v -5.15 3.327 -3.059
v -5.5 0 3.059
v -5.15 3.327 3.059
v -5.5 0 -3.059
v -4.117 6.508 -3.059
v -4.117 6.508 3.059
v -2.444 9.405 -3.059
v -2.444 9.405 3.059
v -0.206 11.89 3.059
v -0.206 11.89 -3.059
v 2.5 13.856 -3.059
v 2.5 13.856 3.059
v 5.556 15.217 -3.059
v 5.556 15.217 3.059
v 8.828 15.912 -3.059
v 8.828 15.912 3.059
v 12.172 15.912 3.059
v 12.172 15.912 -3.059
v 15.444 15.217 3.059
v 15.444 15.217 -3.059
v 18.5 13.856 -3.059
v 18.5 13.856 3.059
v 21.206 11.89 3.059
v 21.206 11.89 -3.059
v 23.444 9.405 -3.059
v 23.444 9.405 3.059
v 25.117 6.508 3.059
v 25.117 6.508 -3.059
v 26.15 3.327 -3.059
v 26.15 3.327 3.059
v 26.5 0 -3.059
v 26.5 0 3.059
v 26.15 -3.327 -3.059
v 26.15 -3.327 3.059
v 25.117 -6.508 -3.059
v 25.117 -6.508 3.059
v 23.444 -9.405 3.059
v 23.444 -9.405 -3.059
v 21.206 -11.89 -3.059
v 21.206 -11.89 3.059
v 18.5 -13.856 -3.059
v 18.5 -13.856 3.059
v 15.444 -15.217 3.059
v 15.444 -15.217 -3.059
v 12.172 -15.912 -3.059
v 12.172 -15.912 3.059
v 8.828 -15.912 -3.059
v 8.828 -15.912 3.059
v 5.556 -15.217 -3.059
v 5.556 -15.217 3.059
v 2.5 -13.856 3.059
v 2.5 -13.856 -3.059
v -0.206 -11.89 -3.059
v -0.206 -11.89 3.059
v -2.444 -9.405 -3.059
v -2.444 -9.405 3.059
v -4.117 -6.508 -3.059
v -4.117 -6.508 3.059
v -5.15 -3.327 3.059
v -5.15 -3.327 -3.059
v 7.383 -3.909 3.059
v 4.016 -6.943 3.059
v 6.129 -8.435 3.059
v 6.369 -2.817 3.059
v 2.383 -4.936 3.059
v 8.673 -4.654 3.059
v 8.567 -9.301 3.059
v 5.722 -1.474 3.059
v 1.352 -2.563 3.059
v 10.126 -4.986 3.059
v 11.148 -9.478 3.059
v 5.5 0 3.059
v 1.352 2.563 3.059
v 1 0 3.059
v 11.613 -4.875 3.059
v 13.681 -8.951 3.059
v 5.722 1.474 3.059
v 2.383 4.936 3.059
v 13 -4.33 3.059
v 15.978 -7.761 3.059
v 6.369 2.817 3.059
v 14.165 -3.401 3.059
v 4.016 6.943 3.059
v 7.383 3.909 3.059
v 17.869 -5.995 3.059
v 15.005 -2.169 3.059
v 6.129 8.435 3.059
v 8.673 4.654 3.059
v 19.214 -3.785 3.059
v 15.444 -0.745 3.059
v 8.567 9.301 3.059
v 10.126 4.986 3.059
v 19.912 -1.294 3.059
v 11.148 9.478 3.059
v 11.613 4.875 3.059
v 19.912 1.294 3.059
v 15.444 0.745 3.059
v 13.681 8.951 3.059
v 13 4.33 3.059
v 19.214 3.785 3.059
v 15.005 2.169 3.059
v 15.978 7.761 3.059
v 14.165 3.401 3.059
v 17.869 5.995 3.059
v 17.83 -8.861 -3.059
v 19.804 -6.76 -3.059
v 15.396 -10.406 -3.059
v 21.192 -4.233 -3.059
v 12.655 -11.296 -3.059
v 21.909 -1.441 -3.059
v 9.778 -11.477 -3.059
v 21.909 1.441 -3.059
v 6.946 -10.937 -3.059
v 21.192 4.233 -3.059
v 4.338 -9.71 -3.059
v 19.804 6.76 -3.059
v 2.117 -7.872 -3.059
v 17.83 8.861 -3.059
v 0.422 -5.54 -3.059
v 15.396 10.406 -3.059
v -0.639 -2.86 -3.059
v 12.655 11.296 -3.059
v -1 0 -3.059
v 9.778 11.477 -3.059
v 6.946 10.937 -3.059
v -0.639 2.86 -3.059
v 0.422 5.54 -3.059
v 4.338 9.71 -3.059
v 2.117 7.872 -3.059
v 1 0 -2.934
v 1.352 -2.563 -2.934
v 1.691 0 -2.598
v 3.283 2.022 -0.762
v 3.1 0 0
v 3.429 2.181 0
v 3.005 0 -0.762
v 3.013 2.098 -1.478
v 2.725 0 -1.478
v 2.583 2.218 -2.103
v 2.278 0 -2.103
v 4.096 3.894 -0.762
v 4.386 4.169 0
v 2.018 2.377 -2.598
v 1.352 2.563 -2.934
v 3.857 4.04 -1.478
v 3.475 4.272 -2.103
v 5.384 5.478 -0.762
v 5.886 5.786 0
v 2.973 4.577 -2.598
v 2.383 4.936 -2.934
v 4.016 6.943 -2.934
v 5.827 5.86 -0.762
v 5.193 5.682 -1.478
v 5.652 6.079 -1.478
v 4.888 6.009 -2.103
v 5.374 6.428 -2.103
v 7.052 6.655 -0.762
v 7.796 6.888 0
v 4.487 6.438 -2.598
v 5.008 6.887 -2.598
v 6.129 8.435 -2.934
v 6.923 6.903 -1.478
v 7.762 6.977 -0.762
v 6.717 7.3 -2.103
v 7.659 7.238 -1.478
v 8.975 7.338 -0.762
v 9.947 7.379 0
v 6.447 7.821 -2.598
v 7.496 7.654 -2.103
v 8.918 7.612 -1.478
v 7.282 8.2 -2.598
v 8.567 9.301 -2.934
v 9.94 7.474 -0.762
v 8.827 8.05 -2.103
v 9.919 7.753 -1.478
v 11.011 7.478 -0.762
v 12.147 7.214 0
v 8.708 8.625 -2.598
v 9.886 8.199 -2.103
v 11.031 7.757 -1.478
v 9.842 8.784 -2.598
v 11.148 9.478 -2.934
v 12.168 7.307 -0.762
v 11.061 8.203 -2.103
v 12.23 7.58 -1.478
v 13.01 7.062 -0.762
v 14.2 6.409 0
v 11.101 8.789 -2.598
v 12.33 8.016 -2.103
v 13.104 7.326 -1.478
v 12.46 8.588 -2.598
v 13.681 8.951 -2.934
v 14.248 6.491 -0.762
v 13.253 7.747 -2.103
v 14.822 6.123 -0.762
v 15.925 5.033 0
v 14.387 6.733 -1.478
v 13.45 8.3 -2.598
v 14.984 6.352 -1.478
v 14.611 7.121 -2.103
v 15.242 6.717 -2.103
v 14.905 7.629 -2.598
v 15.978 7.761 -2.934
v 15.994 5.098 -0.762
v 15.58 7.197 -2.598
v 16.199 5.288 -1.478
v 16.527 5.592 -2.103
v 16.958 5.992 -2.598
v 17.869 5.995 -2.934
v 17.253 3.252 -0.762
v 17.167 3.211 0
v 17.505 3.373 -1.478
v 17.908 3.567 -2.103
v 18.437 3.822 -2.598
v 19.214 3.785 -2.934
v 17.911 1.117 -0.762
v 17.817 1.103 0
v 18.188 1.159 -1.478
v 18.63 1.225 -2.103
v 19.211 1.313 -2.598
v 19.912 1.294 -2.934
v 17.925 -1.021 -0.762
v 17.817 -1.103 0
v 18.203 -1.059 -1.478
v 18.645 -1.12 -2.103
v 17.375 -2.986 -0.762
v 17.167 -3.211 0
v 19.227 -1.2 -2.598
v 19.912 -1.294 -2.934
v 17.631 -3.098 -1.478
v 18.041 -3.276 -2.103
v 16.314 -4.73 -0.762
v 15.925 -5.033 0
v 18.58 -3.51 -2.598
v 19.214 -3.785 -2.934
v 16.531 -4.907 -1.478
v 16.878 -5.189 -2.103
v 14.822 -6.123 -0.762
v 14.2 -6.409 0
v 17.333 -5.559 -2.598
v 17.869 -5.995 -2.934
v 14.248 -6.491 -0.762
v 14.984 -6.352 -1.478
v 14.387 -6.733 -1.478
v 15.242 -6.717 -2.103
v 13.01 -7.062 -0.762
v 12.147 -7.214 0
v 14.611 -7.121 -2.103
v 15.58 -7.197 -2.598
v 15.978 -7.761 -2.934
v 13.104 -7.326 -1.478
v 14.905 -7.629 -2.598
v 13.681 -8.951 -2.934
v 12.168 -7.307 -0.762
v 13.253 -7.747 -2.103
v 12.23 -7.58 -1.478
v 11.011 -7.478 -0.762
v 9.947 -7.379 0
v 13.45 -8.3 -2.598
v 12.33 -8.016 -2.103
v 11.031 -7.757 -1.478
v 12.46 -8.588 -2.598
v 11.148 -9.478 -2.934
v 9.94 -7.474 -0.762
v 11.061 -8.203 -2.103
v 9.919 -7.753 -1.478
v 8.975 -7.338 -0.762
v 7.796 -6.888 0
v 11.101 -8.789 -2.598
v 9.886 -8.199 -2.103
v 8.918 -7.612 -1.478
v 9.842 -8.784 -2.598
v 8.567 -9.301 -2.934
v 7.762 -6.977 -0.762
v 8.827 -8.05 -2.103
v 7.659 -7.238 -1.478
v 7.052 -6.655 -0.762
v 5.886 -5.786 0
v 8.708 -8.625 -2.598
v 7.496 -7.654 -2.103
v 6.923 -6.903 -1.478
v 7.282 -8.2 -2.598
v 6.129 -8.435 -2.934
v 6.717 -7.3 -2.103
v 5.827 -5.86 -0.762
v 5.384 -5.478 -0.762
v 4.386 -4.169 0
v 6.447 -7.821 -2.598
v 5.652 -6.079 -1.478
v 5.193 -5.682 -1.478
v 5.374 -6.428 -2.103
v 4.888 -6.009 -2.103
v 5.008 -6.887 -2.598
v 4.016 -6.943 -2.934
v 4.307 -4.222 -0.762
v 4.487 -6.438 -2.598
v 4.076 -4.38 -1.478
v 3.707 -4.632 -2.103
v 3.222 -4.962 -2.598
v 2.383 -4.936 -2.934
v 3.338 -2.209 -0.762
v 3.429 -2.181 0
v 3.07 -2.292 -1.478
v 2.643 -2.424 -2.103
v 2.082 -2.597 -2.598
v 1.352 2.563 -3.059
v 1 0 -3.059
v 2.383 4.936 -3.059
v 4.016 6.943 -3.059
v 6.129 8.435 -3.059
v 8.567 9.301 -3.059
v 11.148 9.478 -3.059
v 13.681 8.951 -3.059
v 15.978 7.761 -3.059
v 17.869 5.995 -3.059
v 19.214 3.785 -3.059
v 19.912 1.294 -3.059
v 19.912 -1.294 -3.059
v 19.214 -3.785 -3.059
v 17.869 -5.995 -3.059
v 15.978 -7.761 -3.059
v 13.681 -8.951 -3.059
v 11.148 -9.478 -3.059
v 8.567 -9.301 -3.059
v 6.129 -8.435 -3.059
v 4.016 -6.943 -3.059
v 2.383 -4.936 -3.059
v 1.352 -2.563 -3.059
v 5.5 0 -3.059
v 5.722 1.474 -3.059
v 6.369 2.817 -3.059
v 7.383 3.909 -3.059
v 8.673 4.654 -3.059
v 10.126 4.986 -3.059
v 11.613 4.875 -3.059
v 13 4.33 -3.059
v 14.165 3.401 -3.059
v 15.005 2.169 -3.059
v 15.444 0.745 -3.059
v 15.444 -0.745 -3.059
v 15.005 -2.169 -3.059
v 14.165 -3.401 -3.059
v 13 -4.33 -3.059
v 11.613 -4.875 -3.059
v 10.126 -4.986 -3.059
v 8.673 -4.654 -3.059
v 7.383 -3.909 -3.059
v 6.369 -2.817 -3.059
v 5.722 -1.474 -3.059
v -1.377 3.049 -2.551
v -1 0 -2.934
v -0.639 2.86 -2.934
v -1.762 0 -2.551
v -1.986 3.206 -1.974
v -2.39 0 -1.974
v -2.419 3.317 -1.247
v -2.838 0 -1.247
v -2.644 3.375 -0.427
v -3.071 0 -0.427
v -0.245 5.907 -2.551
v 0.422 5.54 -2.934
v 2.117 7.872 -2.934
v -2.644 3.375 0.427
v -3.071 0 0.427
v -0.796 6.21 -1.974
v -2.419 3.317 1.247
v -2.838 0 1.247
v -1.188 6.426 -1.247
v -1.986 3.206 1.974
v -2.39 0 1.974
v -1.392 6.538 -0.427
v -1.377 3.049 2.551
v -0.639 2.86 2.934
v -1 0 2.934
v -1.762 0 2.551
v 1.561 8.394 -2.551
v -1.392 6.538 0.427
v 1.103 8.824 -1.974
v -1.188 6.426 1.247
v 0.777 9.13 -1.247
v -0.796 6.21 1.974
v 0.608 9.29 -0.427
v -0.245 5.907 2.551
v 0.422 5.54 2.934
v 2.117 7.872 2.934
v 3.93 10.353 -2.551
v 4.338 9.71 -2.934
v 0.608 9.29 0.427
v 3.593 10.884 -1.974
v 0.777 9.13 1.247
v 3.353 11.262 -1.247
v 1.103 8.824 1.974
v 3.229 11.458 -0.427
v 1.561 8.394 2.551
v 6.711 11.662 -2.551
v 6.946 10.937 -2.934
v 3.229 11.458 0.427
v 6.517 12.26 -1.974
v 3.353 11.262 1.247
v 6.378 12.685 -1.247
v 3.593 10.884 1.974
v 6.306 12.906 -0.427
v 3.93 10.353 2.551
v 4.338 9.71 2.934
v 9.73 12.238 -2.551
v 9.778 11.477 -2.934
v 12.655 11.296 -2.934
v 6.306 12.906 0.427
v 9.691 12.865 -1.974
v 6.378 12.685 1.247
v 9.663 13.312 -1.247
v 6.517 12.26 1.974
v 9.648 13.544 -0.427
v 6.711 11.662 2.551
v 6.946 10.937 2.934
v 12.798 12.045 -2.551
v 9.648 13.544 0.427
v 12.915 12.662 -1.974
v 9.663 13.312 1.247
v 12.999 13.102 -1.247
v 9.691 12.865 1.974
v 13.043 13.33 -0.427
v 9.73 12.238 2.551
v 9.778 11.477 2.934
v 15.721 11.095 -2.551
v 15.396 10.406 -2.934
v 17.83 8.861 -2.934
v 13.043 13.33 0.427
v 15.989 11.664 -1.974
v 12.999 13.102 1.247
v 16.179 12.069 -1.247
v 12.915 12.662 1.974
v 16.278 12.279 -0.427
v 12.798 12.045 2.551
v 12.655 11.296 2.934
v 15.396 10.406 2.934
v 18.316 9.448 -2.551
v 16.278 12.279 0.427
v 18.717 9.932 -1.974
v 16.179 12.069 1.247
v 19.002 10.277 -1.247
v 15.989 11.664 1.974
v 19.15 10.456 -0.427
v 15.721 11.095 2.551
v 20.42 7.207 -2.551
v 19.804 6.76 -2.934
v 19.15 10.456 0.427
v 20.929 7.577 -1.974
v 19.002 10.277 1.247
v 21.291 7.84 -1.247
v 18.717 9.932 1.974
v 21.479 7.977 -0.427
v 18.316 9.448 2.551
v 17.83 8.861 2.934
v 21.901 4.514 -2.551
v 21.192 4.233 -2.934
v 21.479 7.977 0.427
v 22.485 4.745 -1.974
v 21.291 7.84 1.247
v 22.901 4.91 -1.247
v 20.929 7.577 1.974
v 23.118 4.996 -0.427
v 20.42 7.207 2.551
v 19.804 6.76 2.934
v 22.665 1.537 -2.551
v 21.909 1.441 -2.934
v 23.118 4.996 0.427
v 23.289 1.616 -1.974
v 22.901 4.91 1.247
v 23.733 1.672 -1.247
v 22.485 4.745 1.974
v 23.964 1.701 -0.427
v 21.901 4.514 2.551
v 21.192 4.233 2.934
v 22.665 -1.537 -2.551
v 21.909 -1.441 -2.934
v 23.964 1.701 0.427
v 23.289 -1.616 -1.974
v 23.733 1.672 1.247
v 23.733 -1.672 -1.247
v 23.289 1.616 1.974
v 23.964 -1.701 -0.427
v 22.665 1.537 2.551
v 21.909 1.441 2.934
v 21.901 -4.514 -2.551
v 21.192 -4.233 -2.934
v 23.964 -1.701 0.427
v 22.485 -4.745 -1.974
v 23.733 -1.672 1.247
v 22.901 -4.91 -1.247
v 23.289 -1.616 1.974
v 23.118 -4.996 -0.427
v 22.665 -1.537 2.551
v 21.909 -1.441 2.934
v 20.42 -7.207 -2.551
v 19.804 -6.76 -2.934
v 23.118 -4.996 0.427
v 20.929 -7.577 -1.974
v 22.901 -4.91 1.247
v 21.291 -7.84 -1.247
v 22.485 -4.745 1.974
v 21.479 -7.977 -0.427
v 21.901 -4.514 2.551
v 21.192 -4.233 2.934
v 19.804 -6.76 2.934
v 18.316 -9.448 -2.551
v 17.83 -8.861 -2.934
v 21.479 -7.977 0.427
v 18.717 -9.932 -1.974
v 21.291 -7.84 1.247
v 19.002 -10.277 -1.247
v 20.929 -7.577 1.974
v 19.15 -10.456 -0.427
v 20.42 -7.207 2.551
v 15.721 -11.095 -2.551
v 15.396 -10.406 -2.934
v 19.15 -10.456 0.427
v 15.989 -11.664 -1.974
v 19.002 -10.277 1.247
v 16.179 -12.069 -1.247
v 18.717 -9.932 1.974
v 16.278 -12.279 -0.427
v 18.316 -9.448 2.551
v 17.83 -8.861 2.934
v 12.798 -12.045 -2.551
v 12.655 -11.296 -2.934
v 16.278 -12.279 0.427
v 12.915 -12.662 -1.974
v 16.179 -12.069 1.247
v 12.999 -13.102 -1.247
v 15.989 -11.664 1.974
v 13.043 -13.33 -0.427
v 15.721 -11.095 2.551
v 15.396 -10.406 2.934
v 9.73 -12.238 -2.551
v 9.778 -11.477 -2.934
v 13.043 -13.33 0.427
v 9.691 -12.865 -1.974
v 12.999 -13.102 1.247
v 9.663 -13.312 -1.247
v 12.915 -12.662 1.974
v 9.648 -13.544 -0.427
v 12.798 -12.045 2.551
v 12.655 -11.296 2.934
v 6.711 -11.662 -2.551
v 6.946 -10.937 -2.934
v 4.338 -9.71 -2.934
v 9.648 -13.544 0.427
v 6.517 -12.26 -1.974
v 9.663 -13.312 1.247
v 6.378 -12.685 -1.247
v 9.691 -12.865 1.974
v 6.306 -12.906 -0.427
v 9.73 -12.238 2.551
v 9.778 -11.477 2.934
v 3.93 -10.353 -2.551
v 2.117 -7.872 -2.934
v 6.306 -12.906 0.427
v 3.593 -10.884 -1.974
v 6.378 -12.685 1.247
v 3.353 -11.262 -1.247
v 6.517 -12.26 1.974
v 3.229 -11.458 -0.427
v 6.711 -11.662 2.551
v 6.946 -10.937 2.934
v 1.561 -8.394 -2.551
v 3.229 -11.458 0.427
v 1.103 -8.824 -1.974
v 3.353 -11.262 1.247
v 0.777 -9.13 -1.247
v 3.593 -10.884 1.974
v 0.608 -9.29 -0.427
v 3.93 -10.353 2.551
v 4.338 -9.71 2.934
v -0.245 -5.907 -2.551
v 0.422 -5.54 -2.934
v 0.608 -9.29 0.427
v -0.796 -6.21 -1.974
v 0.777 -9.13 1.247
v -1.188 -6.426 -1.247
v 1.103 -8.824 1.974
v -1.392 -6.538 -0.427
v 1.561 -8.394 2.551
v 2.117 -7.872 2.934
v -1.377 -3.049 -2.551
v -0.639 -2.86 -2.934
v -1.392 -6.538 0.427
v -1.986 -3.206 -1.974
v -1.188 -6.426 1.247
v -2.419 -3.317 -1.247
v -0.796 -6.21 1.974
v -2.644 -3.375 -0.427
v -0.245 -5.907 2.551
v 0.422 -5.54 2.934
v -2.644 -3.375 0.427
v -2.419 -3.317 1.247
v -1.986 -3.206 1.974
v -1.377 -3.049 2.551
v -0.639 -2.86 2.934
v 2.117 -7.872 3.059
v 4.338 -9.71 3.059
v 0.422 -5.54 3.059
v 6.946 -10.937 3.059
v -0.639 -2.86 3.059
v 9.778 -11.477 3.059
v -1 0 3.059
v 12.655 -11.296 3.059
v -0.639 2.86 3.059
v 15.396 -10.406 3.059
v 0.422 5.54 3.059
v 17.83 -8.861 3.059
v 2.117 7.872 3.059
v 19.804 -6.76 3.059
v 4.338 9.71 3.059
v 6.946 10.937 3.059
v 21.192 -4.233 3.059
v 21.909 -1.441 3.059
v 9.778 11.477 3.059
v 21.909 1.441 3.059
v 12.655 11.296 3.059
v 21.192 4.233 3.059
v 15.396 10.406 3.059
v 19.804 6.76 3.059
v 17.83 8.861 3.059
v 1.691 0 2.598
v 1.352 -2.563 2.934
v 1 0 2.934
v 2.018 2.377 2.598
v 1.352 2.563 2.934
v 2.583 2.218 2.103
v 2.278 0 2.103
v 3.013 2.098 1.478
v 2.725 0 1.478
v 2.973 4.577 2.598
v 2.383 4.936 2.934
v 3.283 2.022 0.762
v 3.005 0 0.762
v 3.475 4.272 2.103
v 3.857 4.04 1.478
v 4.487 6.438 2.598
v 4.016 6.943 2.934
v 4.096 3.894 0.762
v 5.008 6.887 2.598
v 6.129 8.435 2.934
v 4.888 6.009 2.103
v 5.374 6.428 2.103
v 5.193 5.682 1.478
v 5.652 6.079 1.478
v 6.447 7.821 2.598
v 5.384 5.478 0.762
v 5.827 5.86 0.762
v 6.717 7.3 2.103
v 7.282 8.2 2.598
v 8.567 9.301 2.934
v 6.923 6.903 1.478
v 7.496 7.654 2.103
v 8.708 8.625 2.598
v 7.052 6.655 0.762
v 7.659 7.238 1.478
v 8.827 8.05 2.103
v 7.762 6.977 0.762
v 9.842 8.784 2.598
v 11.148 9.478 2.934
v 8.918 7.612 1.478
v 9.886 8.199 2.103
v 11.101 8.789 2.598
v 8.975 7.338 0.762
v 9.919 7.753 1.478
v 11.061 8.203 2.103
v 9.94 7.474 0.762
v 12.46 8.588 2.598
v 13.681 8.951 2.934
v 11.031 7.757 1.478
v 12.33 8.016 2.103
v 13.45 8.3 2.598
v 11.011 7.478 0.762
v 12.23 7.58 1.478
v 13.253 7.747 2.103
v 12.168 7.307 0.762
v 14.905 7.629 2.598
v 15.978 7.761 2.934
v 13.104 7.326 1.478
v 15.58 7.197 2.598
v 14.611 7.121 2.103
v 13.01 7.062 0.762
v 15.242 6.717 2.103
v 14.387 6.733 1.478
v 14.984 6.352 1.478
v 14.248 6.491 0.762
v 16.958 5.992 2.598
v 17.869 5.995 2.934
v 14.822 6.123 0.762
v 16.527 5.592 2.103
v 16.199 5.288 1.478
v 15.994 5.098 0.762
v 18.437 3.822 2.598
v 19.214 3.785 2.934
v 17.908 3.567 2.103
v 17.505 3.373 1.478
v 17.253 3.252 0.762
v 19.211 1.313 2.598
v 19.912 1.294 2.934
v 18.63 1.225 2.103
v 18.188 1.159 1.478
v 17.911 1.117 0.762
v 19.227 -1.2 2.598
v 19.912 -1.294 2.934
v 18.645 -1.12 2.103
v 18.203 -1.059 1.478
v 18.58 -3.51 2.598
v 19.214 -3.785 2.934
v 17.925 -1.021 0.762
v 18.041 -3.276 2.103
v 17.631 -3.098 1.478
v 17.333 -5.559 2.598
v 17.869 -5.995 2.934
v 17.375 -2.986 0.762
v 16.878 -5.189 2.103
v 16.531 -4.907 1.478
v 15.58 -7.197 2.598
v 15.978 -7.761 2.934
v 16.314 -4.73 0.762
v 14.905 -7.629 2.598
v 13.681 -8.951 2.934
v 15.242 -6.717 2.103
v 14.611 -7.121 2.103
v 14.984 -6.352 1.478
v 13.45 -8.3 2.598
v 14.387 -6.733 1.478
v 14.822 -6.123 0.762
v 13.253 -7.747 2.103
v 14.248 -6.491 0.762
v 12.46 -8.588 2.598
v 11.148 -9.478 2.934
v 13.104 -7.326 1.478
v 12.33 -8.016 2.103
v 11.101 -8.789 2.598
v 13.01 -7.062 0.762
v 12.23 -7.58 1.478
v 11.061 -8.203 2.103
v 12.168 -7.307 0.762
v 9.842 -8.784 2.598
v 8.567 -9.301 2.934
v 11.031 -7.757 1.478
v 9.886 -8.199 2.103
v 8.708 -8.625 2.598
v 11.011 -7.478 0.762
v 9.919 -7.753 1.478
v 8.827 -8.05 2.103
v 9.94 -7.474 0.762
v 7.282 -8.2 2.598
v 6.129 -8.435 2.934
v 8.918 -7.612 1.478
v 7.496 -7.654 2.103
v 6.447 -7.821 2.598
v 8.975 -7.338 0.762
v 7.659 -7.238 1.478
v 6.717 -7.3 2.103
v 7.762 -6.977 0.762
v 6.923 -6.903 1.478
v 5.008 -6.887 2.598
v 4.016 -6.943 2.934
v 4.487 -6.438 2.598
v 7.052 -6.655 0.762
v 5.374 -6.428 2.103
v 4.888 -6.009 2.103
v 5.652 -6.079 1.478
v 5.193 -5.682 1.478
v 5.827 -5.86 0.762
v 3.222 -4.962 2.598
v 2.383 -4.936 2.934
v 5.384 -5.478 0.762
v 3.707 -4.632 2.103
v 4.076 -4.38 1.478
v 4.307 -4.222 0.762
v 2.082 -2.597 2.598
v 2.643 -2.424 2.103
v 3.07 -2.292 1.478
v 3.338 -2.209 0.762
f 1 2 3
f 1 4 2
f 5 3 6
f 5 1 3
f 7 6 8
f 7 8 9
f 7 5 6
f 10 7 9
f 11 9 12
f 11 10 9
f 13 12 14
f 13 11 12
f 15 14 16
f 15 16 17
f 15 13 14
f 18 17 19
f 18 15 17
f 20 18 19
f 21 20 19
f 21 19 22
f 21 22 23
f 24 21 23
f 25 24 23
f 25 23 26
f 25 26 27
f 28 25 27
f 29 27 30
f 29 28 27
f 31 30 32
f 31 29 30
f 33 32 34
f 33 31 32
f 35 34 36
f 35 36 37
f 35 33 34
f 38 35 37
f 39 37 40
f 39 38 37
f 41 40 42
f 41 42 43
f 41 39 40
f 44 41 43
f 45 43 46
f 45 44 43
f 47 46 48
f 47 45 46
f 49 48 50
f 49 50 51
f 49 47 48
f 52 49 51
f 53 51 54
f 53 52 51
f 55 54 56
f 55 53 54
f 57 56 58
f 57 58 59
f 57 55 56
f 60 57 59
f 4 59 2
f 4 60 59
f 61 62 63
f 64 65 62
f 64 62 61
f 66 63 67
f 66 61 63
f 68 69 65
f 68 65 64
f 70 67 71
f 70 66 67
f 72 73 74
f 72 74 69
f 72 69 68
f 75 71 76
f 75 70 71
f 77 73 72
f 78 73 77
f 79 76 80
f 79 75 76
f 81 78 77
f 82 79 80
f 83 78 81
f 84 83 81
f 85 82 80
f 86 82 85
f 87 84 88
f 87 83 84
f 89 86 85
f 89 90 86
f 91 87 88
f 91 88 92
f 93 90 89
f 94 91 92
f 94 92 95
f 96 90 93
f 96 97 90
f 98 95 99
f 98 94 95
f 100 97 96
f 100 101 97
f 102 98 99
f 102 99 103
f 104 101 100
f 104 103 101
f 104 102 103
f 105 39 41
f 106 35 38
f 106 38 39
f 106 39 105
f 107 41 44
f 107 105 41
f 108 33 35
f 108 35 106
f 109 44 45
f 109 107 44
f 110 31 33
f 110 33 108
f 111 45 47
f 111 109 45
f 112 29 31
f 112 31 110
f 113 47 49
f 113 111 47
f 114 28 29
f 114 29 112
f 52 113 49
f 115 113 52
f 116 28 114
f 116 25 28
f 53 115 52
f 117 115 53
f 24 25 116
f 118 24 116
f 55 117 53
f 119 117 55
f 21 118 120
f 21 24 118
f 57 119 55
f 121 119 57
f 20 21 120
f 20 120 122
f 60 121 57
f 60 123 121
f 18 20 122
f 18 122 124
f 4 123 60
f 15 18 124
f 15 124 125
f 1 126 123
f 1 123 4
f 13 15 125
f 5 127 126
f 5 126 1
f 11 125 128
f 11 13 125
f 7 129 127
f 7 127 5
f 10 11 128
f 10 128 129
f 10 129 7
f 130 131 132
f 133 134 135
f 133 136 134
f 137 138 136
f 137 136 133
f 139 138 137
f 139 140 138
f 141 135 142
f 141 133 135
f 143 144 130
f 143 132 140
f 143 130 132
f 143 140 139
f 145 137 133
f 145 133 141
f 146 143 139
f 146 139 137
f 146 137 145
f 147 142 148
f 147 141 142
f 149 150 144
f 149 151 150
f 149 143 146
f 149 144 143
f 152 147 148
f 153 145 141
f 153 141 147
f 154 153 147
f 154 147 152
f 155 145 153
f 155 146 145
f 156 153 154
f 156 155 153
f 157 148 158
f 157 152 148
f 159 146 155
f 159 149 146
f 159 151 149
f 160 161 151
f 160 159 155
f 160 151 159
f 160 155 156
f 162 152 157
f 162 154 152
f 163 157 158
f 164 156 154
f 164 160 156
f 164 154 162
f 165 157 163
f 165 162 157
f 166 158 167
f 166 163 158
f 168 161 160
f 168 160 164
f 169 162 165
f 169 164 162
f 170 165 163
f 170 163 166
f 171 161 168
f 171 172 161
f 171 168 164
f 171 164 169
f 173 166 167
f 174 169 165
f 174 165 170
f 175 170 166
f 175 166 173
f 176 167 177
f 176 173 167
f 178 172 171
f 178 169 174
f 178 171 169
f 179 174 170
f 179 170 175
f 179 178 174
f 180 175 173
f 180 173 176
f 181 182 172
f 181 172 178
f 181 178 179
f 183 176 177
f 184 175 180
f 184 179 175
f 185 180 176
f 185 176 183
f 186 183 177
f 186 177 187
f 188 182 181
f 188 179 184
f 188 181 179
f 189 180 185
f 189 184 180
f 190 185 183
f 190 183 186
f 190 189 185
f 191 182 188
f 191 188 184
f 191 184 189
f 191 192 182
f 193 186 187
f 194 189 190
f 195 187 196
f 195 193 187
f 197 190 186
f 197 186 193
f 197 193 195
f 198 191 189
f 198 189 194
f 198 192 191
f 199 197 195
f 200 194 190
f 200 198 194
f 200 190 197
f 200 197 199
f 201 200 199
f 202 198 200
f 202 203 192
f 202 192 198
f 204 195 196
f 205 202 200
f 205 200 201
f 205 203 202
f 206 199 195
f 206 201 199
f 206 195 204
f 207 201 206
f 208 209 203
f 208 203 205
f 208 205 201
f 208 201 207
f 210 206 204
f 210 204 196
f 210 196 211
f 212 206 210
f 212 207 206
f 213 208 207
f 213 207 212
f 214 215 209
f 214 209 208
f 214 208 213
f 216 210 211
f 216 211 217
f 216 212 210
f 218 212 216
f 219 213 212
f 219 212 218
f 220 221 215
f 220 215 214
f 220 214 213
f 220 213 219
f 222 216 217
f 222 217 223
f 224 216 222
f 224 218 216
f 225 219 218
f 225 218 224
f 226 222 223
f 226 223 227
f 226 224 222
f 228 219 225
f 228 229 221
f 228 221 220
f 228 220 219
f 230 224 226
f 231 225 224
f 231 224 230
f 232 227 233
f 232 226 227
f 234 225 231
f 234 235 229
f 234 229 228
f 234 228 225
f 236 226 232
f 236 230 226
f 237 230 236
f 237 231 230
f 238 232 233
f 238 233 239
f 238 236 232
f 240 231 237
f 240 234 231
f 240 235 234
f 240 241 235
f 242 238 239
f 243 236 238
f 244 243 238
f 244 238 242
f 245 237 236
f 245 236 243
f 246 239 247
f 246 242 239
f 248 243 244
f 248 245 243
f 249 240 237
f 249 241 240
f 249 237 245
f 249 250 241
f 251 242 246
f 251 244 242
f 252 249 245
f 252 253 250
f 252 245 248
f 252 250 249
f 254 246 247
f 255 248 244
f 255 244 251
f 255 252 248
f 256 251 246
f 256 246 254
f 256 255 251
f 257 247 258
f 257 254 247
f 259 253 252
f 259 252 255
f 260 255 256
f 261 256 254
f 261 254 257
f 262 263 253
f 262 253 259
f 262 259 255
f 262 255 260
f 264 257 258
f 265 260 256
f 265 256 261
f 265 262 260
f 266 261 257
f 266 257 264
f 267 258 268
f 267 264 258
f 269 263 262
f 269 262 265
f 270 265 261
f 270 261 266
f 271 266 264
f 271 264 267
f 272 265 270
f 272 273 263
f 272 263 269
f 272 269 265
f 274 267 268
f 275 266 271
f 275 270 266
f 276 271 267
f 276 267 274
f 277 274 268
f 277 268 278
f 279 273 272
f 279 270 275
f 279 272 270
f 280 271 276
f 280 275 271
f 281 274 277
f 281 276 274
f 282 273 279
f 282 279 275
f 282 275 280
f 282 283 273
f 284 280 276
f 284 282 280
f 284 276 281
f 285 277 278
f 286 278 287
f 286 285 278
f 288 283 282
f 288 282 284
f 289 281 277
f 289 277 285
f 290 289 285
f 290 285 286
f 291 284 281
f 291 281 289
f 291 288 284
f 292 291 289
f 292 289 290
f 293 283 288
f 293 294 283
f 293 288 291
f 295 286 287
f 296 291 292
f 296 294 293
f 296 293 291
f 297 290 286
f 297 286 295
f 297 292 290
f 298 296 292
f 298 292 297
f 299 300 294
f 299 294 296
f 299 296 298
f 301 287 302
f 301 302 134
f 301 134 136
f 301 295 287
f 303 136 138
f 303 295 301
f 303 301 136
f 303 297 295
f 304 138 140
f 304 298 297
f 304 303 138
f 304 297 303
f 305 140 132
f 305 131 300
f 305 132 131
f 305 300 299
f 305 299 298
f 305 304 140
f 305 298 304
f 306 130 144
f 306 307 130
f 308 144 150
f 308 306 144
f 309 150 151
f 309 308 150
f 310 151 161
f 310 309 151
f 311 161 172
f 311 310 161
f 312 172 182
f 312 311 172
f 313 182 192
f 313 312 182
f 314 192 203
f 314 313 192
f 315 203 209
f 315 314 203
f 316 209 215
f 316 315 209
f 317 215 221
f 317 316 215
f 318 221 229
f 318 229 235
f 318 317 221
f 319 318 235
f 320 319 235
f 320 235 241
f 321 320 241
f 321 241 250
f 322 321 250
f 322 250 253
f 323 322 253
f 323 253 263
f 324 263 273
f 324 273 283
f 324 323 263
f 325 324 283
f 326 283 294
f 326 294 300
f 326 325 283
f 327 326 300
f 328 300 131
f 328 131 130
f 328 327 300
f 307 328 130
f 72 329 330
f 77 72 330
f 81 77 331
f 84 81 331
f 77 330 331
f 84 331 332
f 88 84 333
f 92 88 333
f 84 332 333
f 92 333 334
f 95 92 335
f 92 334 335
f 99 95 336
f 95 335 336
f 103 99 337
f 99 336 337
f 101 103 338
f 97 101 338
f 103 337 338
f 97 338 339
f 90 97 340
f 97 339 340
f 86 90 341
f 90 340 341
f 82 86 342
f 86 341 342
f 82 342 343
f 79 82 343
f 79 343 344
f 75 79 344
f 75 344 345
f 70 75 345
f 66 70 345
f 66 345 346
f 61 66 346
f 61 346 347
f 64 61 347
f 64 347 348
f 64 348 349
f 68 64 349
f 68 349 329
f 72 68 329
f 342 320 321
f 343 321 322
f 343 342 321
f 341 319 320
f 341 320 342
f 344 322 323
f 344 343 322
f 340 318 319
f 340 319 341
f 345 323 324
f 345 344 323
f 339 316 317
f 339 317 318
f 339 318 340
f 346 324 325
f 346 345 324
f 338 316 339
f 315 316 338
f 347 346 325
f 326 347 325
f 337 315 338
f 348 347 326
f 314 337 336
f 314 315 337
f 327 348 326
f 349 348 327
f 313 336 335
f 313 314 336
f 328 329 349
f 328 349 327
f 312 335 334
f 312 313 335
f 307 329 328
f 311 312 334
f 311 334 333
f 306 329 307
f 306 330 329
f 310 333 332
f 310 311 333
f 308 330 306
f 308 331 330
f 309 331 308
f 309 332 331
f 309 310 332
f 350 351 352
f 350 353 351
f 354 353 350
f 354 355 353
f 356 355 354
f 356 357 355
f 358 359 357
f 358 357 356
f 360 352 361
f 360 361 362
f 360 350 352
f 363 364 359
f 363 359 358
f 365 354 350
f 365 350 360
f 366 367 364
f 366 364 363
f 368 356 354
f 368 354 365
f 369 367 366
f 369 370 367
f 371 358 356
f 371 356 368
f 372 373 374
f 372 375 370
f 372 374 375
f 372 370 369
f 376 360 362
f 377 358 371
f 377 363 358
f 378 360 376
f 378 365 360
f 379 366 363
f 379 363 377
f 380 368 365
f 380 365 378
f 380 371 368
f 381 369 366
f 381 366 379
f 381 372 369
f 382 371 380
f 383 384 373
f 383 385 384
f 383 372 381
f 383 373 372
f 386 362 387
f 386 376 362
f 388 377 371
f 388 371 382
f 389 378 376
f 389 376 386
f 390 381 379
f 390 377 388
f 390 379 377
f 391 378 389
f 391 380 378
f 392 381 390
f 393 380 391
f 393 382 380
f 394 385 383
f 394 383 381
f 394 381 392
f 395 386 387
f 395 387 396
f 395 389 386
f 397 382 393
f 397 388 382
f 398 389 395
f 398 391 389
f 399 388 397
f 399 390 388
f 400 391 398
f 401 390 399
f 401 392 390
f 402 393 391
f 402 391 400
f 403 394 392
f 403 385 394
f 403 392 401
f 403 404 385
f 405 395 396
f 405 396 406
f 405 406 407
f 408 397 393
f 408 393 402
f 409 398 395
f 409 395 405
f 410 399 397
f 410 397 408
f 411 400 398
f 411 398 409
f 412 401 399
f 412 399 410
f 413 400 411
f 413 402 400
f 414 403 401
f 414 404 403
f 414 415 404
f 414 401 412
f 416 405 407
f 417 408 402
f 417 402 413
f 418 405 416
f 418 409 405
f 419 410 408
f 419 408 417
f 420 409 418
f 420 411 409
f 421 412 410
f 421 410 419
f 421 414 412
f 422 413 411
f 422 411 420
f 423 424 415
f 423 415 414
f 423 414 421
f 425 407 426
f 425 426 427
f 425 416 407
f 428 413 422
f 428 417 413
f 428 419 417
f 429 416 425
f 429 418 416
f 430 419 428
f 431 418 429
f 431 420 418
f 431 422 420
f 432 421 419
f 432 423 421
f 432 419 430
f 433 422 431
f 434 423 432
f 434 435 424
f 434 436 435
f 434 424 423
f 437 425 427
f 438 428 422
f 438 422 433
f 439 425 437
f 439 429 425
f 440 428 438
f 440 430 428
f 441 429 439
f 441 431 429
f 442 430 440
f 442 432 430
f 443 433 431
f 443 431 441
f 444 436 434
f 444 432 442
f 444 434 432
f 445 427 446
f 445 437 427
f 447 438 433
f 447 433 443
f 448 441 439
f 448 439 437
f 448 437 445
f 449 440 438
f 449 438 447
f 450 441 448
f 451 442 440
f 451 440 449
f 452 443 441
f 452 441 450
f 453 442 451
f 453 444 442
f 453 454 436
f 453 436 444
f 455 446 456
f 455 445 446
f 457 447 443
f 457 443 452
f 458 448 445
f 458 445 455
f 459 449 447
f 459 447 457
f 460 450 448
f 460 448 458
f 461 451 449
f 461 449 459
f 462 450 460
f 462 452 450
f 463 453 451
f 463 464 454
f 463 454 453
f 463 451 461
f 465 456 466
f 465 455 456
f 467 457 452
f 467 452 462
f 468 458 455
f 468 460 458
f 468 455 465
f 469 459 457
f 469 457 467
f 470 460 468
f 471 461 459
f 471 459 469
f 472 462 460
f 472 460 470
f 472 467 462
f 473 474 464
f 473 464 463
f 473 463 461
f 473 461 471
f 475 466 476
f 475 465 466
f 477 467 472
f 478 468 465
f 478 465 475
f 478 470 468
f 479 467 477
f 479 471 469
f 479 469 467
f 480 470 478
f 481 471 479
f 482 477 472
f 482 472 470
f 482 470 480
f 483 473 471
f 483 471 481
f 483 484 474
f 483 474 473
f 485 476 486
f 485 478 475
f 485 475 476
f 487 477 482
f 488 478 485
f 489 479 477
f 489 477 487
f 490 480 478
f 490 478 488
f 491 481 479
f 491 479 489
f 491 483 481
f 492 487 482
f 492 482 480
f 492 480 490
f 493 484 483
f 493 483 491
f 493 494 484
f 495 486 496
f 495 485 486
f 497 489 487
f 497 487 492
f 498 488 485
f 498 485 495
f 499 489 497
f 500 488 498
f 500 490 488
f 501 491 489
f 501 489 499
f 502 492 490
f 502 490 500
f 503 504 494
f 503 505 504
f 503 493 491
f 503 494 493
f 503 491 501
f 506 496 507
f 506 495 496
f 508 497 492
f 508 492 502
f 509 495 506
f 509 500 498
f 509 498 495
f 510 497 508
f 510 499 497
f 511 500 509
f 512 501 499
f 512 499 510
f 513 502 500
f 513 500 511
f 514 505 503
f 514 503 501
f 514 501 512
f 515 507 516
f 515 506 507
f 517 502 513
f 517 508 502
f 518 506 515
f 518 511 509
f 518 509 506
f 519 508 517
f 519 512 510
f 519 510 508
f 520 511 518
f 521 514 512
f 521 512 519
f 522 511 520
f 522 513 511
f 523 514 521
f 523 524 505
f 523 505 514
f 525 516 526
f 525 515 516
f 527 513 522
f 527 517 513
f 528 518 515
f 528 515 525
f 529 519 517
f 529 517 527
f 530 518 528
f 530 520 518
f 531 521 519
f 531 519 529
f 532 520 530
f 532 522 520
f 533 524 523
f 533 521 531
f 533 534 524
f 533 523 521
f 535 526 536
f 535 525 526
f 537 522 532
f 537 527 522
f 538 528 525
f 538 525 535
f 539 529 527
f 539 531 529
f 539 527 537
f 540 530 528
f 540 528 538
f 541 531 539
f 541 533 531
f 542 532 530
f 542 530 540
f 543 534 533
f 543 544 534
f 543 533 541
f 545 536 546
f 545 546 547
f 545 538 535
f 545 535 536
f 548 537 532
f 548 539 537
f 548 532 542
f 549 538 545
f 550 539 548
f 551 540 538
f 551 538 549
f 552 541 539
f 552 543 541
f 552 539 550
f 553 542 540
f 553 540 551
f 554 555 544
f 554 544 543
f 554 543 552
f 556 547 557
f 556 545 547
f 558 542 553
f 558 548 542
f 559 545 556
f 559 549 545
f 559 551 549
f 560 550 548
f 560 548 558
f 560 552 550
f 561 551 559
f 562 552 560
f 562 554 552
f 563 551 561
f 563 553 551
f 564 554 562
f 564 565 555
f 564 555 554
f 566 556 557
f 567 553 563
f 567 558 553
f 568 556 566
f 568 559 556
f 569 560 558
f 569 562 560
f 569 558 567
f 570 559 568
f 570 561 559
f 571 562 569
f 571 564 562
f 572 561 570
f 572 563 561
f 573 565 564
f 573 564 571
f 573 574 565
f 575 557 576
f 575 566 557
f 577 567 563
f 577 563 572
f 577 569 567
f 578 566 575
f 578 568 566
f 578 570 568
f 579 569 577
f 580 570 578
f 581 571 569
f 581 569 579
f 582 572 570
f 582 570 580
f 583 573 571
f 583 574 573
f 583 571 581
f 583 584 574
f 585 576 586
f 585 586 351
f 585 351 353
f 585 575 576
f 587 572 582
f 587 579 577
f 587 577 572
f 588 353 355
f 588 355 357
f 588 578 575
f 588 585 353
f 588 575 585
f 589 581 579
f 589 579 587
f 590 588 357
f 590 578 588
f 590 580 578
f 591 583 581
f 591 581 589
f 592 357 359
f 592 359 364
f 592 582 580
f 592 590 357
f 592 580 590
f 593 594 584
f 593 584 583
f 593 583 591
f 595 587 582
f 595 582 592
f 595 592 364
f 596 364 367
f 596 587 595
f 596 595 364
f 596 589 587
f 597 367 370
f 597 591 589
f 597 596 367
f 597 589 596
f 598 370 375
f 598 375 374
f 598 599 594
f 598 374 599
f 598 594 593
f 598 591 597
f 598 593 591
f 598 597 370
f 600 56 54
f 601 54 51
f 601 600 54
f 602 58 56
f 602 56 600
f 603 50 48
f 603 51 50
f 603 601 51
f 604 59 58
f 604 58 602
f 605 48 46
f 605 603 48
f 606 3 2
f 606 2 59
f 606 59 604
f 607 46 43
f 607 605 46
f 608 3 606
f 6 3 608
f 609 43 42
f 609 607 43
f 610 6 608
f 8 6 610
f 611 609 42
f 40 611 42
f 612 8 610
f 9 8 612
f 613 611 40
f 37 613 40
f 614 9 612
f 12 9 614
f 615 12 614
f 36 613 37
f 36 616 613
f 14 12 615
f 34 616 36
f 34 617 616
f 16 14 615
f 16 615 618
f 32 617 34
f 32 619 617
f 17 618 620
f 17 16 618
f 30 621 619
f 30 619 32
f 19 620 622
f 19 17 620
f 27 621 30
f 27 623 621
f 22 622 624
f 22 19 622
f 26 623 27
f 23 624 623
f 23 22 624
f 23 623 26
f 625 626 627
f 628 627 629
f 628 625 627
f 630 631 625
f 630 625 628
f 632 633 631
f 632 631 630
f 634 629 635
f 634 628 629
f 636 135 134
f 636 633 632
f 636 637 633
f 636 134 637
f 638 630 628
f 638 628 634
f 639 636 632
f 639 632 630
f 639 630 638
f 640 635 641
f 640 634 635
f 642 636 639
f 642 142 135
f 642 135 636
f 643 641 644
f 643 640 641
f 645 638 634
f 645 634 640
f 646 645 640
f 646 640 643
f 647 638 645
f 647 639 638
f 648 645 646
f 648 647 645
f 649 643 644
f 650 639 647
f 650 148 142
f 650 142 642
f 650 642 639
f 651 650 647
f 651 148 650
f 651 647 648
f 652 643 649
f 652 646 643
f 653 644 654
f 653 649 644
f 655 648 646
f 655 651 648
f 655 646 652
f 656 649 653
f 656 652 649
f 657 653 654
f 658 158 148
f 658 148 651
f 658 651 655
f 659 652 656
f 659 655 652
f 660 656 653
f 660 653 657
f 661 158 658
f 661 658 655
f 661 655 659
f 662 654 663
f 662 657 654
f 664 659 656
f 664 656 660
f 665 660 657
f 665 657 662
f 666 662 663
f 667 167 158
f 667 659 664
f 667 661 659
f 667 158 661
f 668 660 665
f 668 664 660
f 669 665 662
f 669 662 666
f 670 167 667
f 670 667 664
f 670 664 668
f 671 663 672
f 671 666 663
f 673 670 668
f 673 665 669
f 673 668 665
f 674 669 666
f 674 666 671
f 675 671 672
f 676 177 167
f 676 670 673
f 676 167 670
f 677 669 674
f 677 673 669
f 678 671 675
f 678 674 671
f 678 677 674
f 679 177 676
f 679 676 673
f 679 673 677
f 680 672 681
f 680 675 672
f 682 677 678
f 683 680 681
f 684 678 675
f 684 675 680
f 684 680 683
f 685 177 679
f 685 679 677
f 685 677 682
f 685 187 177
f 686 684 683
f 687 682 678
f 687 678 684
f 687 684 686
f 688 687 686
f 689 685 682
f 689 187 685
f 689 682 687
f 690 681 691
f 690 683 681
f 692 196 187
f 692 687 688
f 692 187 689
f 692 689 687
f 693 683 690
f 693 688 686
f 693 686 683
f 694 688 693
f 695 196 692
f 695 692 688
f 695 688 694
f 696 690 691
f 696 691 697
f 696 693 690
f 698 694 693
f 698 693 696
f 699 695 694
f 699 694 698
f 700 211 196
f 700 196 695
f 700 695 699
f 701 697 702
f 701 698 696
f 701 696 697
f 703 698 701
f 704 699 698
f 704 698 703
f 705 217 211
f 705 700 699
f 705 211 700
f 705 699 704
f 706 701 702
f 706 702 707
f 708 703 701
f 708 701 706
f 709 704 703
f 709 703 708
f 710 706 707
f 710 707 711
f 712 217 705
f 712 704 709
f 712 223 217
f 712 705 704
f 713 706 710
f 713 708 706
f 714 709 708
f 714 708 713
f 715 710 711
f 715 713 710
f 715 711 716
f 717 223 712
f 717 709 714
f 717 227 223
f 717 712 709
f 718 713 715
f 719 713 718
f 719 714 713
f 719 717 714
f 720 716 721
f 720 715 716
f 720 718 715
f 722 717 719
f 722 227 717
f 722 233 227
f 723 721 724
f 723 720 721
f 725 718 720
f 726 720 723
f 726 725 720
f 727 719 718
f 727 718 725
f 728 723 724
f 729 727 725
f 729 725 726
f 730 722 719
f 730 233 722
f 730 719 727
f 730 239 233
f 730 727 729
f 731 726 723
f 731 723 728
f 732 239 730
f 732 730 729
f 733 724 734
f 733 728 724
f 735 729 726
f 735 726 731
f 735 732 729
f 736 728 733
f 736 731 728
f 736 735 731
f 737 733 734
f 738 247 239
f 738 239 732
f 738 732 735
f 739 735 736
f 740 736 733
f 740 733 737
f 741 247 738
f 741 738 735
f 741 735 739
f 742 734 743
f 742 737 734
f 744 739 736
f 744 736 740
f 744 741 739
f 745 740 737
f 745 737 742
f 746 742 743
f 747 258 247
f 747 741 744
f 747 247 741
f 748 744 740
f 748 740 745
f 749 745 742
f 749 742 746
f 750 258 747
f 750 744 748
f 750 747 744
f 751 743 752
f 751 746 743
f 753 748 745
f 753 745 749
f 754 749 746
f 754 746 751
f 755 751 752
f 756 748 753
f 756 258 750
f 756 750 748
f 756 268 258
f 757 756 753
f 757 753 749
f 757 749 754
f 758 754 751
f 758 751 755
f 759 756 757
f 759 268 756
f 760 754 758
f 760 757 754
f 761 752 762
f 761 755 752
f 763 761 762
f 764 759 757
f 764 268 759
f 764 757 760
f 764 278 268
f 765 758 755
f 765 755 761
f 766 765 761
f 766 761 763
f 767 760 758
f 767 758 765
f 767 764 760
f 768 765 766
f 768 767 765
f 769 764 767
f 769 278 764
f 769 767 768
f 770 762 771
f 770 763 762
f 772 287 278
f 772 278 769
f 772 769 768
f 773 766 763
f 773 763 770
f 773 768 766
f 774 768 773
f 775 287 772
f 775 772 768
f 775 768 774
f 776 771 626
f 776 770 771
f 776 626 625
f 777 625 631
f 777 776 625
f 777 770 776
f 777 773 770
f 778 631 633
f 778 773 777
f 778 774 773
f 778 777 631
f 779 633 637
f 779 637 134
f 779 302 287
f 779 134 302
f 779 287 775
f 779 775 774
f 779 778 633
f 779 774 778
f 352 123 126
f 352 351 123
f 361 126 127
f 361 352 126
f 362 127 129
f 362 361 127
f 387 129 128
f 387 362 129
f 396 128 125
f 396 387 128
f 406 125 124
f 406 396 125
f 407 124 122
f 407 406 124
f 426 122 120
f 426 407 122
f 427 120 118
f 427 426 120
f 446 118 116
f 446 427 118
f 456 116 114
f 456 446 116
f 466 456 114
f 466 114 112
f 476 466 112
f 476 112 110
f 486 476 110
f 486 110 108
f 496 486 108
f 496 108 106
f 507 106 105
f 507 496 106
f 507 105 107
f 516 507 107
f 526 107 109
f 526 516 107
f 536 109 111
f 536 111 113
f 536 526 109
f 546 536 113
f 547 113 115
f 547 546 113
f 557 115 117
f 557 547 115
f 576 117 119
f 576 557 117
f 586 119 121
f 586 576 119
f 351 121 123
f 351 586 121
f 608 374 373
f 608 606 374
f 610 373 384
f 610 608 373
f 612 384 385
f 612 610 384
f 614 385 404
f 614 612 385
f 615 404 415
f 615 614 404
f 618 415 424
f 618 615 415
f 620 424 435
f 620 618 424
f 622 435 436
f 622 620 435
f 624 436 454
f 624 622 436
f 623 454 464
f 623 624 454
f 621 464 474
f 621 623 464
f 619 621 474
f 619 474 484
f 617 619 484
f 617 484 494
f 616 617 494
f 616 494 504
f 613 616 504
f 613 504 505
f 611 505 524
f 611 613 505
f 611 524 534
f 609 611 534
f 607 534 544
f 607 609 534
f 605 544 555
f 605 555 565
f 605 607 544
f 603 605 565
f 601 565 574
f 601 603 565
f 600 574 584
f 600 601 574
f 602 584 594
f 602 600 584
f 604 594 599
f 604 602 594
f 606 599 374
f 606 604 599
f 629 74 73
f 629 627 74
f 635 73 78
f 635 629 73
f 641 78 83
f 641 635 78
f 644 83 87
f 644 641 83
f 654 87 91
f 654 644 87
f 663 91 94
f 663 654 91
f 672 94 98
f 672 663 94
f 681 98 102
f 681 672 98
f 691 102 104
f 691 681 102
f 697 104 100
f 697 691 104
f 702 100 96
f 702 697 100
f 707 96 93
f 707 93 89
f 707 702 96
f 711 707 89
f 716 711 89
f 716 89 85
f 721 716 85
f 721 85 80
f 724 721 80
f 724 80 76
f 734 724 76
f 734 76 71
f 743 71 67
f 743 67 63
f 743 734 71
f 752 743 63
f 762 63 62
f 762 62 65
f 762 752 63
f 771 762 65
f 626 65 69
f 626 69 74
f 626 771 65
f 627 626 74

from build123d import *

# Parameters (mm, degrees)
F4_D = 10


with BuildPart() as f1:
    # F0 (on Front) → F1 (revolve)
    with BuildSketch(Plane.XZ):
        with BuildLine():
            Line((1, 3.059412), (1, 2.93428))
            ThreePointArc((1, 2.93428), (2.520913, 1.804162), (3.1, 0))
            ThreePointArc((3.1, 0), (2.520913, -1.804162), (1, -2.93428))
            Line((1, -2.93428), (1, -3.059412))
            Line((1, -3.059412), (10.5, -3.059412))
            Line((10.5, -3.059412), (10.5, 3.059412))
            Line((10.5, 3.059412), (1, 3.059412))
        make_face()
    revolve(axis=Axis((10.5, 0, 0), (0, 0, -1)))

    # F4 (through all)
    with Locations(Plane.XY.offset(3.059412)):
        with Locations((10.5, 0)):
            Hole(F4_D / 2)


with BuildPart() as f2:
    # F0 (on Front) → F2 (revolve)
    with BuildSketch(Plane.XZ):
        with BuildLine():
            ThreePointArc((-1, -2.93428), (-3.1, 0), (-1, 2.93428))
            Line((-1, 2.93428), (-1, 3.059412))
            Line((-1, 3.059412), (-5.5, 3.059412))
            Line((-5.5, 3.059412), (-5.5, -3.059412))
            Line((-5.5, -3.059412), (-1, -3.059412))
            Line((-1, -3.059412), (-1, -2.93428))
        make_face()
    revolve(axis=Axis((10.5, 0, 0), (0, 0, -1)))


solid = Compound([f1.part, f2.part])
